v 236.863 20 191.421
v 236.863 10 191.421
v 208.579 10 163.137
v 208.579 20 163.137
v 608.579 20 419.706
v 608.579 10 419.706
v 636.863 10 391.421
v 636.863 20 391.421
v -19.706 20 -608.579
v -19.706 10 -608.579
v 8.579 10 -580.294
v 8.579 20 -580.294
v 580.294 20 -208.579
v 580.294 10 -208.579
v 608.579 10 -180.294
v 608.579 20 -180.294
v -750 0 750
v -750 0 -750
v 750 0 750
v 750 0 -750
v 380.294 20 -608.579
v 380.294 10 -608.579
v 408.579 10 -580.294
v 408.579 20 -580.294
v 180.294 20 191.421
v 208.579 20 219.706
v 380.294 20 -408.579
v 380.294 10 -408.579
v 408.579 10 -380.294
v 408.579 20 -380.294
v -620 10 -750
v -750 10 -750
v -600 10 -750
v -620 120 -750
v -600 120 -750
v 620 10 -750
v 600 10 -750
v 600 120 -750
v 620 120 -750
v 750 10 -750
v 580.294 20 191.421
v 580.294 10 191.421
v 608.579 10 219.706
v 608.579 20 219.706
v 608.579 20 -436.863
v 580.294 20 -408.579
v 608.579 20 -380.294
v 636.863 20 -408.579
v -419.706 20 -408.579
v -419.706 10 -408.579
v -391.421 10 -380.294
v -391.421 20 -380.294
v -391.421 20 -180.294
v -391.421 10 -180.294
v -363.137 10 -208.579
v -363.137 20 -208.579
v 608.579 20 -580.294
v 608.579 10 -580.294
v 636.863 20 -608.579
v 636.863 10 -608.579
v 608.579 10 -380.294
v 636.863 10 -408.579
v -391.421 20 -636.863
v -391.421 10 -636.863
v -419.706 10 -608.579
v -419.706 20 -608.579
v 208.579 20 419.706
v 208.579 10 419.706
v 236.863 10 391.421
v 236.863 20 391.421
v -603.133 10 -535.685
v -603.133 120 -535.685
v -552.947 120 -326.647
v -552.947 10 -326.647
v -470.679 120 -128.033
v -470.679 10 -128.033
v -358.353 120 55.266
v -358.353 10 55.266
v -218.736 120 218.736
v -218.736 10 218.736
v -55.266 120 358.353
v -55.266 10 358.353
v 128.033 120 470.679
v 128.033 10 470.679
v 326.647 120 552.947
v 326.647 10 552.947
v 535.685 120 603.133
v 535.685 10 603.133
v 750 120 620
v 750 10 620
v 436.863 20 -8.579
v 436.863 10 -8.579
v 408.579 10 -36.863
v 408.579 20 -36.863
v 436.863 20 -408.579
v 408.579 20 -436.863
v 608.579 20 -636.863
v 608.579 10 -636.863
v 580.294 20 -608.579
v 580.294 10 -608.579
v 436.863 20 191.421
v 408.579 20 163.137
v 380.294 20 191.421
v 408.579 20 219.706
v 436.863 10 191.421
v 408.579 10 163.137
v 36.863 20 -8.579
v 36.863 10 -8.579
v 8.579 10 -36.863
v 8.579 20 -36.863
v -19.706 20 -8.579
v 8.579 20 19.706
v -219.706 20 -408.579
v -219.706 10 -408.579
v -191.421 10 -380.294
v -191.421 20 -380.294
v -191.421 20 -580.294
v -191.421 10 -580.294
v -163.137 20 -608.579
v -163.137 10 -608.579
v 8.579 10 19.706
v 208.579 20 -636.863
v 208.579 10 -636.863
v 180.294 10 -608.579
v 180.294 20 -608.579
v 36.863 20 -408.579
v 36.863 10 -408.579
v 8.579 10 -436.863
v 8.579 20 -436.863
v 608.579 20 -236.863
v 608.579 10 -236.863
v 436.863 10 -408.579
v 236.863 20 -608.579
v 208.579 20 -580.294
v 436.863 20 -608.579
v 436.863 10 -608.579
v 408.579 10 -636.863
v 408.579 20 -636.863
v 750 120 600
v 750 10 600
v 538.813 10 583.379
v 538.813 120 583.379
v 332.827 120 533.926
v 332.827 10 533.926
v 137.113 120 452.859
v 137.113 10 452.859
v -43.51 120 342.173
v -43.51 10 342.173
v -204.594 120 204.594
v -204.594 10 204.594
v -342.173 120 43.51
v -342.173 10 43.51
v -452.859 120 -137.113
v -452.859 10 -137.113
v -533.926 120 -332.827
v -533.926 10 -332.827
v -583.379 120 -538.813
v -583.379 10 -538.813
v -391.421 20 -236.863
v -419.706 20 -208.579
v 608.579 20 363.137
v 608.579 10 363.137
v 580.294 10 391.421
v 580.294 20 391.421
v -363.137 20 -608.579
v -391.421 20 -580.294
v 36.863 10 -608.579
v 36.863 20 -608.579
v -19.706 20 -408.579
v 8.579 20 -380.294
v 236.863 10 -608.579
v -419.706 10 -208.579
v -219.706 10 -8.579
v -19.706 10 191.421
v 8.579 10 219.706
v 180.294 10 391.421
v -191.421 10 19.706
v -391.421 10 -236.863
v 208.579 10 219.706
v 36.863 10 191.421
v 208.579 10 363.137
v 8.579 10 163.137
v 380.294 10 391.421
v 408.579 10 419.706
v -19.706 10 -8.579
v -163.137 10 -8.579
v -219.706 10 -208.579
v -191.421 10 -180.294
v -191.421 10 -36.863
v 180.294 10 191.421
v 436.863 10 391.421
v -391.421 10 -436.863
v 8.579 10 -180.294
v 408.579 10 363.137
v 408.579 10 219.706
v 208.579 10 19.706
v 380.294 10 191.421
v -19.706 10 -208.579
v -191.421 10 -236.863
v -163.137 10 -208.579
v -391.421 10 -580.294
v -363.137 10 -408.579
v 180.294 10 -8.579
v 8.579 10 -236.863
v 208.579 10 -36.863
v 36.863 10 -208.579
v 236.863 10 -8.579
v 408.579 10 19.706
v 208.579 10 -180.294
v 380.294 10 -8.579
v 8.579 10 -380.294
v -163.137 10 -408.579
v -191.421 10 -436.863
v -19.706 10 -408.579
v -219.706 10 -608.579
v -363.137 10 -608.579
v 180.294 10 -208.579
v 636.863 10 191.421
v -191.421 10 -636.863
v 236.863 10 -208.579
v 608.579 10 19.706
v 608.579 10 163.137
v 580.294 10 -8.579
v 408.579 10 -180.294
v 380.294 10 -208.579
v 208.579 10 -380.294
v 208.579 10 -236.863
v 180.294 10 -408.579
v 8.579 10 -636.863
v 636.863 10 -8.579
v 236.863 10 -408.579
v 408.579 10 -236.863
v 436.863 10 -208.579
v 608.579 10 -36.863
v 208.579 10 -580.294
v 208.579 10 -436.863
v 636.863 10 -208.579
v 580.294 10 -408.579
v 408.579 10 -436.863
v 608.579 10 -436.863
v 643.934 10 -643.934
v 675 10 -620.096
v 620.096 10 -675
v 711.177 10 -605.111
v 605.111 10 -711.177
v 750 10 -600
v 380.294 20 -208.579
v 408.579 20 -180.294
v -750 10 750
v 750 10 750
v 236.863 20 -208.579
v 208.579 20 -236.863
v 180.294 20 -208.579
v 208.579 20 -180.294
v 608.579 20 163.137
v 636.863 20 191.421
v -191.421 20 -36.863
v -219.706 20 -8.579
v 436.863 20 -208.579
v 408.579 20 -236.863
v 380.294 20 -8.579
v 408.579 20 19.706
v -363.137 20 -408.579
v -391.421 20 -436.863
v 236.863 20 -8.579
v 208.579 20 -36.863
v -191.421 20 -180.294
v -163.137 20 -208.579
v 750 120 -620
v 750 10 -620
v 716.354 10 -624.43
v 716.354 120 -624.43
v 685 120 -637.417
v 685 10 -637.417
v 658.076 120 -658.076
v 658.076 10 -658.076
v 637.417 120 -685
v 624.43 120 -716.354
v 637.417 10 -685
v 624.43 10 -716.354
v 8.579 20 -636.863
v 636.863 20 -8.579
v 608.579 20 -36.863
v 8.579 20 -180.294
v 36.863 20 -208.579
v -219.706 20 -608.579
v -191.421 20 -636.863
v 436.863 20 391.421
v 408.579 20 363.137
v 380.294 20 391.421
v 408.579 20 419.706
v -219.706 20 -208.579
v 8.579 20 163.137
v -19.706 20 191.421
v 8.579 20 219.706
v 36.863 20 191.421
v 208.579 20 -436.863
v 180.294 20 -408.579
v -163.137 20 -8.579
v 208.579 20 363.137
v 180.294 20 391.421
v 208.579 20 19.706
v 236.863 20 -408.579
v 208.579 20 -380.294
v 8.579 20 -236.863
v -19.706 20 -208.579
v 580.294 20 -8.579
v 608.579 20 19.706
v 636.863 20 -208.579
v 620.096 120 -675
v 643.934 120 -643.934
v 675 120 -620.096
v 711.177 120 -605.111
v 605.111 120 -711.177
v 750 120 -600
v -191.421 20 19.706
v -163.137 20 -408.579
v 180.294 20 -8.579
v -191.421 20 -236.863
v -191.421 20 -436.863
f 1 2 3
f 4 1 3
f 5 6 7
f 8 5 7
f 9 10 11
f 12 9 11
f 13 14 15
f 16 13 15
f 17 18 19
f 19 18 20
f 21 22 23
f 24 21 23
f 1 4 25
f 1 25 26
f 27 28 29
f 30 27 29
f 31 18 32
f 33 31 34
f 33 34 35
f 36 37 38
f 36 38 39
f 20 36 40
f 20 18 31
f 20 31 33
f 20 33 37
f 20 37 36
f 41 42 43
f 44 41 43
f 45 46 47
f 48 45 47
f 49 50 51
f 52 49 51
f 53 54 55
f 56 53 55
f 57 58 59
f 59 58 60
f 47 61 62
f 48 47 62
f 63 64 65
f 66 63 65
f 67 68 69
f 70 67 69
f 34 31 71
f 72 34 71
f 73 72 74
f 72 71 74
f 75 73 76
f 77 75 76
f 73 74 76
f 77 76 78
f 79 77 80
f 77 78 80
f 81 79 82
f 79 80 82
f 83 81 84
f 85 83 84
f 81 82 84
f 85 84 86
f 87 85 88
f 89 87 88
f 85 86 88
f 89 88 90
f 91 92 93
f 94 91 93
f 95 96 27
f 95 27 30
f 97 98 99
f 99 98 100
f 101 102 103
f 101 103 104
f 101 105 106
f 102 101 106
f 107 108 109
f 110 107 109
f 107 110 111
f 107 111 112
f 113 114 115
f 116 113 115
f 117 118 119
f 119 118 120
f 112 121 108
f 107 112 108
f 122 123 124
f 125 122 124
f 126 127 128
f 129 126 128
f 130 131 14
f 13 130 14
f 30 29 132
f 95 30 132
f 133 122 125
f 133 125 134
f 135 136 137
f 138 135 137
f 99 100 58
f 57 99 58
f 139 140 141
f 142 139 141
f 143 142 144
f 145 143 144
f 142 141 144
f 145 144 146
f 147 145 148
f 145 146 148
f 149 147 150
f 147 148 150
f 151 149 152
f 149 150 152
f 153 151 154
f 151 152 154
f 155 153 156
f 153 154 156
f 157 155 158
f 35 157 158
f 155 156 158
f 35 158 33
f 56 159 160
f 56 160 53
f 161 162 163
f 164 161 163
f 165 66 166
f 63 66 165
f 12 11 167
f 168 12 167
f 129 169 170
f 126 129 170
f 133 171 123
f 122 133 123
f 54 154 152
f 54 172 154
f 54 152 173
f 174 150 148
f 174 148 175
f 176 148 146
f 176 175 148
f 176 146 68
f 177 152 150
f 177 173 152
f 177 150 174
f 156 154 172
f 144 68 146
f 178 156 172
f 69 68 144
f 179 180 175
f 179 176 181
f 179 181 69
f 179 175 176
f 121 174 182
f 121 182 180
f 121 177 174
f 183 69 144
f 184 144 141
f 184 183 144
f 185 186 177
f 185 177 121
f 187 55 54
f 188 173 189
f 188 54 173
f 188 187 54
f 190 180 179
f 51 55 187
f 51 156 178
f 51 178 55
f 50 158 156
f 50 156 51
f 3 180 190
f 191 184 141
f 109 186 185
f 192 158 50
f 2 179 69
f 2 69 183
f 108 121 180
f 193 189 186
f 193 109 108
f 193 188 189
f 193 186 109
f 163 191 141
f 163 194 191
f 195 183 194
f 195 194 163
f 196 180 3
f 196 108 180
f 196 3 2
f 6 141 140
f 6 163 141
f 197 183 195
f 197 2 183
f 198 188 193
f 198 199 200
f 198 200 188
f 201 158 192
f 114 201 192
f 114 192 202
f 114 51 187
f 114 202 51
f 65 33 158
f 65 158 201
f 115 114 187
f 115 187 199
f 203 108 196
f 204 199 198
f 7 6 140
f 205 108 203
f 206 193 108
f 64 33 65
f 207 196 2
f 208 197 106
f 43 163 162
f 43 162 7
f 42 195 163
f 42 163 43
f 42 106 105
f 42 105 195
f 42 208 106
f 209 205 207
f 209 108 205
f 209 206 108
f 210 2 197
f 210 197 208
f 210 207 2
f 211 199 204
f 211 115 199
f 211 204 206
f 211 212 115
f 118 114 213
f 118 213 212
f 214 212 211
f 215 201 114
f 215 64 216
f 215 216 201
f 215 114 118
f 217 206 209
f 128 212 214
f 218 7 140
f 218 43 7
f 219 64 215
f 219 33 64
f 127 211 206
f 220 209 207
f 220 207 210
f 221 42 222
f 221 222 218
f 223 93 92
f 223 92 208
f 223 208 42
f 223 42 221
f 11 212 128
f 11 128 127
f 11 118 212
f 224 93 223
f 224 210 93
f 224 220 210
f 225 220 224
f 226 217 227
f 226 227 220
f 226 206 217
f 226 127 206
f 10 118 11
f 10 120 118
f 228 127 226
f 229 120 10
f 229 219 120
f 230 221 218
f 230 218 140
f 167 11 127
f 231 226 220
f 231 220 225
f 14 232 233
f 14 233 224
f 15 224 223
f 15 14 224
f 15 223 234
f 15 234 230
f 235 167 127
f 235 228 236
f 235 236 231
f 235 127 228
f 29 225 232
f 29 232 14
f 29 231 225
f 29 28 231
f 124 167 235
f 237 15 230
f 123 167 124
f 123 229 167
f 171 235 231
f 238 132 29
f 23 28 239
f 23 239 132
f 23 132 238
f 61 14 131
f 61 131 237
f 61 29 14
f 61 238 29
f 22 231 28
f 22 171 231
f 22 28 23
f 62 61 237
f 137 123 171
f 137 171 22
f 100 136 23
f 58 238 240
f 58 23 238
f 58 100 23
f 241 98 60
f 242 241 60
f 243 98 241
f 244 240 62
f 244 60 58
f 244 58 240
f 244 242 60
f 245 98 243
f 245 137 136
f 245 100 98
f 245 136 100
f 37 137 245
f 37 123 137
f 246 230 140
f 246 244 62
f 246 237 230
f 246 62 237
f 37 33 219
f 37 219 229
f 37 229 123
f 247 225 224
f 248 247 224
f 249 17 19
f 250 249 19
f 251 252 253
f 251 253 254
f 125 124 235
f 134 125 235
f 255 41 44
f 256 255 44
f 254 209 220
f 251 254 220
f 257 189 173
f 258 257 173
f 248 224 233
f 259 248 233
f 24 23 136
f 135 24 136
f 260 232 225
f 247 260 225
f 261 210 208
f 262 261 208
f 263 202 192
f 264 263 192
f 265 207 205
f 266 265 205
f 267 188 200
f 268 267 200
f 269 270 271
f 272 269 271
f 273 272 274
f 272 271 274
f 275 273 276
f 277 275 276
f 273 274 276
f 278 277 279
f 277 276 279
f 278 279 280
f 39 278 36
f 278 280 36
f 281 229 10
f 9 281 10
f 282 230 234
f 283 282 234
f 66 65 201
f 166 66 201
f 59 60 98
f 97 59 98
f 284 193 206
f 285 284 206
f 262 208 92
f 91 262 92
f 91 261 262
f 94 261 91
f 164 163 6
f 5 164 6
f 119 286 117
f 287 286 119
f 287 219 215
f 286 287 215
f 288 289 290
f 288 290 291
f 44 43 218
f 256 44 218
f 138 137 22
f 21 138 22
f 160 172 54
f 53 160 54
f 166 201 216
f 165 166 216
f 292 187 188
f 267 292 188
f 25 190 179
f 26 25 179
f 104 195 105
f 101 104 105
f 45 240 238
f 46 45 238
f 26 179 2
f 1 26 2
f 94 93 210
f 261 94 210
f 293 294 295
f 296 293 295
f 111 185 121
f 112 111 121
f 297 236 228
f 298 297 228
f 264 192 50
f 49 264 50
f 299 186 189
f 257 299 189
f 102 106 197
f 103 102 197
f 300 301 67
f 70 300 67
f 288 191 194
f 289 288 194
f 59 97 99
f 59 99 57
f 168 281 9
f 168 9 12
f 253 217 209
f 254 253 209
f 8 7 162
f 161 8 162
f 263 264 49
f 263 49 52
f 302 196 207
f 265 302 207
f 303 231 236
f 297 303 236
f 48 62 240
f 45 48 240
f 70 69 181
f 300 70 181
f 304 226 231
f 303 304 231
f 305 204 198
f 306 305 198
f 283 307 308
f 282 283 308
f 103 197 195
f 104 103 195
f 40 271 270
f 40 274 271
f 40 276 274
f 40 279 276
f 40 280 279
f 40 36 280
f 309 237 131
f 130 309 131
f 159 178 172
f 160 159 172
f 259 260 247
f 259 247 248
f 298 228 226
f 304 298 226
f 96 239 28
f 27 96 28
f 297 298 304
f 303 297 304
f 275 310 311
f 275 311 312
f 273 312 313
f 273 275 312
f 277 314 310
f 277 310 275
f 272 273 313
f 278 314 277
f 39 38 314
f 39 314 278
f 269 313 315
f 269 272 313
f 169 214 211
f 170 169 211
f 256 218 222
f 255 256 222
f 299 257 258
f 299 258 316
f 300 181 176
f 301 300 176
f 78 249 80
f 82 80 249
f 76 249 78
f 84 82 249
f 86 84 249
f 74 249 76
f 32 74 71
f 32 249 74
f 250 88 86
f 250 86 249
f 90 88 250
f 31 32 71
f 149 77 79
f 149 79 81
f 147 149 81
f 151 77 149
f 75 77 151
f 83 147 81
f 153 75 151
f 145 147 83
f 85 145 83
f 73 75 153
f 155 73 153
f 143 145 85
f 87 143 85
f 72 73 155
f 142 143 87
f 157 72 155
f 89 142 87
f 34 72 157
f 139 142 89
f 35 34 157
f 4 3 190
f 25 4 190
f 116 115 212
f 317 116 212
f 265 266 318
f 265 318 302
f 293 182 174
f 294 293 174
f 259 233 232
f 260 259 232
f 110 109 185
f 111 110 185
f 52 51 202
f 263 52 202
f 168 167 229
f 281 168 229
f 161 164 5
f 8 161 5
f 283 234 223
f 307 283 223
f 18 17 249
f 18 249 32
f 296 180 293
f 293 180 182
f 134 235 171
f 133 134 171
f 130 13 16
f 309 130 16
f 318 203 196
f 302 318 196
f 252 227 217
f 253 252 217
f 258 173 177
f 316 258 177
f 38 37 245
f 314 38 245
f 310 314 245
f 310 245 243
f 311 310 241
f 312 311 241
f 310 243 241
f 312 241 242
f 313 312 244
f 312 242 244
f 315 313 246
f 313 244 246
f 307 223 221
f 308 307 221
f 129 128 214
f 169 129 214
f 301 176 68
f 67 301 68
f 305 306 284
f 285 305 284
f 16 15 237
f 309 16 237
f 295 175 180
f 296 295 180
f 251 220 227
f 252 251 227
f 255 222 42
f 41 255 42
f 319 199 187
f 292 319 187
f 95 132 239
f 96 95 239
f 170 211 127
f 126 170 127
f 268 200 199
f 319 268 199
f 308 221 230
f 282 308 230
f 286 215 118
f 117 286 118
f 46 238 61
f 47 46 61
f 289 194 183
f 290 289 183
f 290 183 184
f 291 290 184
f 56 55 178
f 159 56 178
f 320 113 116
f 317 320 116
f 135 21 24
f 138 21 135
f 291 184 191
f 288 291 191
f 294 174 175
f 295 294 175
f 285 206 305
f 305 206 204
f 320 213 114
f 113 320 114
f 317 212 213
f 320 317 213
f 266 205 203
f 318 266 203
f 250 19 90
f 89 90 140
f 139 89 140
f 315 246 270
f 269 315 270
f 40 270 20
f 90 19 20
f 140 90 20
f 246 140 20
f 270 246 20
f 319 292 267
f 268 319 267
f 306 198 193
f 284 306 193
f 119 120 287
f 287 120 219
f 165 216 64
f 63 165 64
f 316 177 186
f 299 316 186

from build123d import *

# Parameters (mm, degrees)
SKETCH2_W           = 1500
SKETCH2_H           = 1500
BOSS_EXTRUDE1_DEPTH = 10
BOSS_EXTRUDE2_DEPTH = 110
BOSS_EXTRUDE3_DEPTH = 10


with BuildPart() as part:
    # Sketch2 → Boss-Extrude1 (new body)
    with BuildSketch(Plane(origin=(0, 0, 0), x_dir=(1, 0, 0), z_dir=(0, 1, 0))):
        Rectangle(SKETCH2_W, SKETCH2_H)
    extrude(amount=BOSS_EXTRUDE1_DEPTH)

    # Sketch3 → Boss-Extrude2 (add)
    with BuildSketch(Plane(origin=(0, 10, 0), x_dir=(1, 0, 0), z_dir=(0, 1, 0))):
        with BuildLine():
            ThreePointArc((750, -600), (-204.594154602, -204.594154602), (-600, 750))
            Line((-600, 750), (-620, 750))
            ThreePointArc((-620, 750), (-218.736290226, -218.736290226), (750, -620))
            Line((750, -620), (750, -600))
        make_face()
        with BuildLine():
            Line((620, 750), (600, 750))
            ThreePointArc((600, 750), (643.933982822, 643.933982822), (750, 600))
            Line((750, 600), (750, 620))
            ThreePointArc((750, 620), (658.076118446, 658.076118446), (620, 750))
        make_face()
    extrude(amount=BOSS_EXTRUDE2_DEPTH)

    # Sketch4 → Boss-Extrude3 (add)
    with BuildSketch(Plane(origin=(0, 10, 0), x_dir=(1, 0, 0), z_dir=(0, 1, 0))):
        Polygon((-391.421356236, 636.86291501), (-419.705627484, 608.578643763), (-391.421356236, 580.294372515), (-363.137084989, 608.578643763), align=None)
        Polygon((-191.421356236, 636.86291501), (-219.705627484, 608.578643763), (-191.421356236, 580.294372515), (-163.137084989, 608.578643763), align=None)
        Polygon((8.578643763, 636.86291501), (-19.705627484, 608.578643763), (8.578643763, 580.294372515), (36.862915011, 608.578643763), align=None)
        Polygon((208.578643763, 636.86291501), (180.294372516, 608.578643763), (208.578643763, 580.294372515), (236.862915011, 608.578643763), align=None)
        Polygon((408.578643763, 636.86291501), (380.294372515, 608.578643763), (408.578643763, 580.294372515), (436.86291501, 608.578643763), align=None)
        Polygon((-191.421356236, 436.86291501), (-219.705627484, 408.578643763), (-191.421356236, 380.294372515), (-163.137084989, 408.578643763), align=None)
        Polygon((8.578643763, 436.86291501), (-19.705627484, 408.578643763), (8.578643763, 380.294372515), (36.862915011, 408.578643763), align=None)
        Polygon((208.578643763, 436.86291501), (180.294372516, 408.578643763), (208.578643763, 380.294372515), (236.862915011, 408.578643763), align=None)
        Polygon((408.578643763, 436.86291501), (380.294372515, 408.578643763), (408.578643763, 380.294372515), (436.86291501, 408.578643763), align=None)
        Polygon((-191.421356236, 236.86291501), (-219.705627484, 208.578643763), (-191.421356236, 180.294372515), (-163.137084989, 208.578643763), align=None)
        Polygon((8.578643763, 236.86291501), (-19.705627484, 208.578643763), (8.578643763, 180.294372515), (36.862915011, 208.578643763), align=None)
        Polygon((208.578643763, 236.86291501), (180.294372516, 208.578643763), (208.578643763, 180.294372515), (236.862915011, 208.578643763), align=None)
        Polygon((408.578643763, 236.86291501), (380.294372515, 208.578643763), (408.578643763, 180.294372515), (436.86291501, 208.578643763), align=None)
        Polygon((-191.421356236, 36.86291501), (-219.705627484, 8.578643763), (-191.421356236, -19.705627485), (-163.137084989, 8.578643763), align=None)
        Polygon((8.578643763, 36.86291501), (-19.705627484, 8.578643763), (8.578643763, -19.705627485), (36.862915011, 8.578643763), align=None)
        Polygon((208.578643763, 36.86291501), (180.294372516, 8.578643763), (208.578643763, -19.705627485), (236.862915011, 8.578643763), align=None)
        Polygon((408.578643763, 36.86291501), (380.294372515, 8.578643763), (408.578643763, -19.705627485), (436.86291501, 8.578643763), align=None)
        Polygon((8.578643763, -163.13708499), (-19.705627484, -191.421356237), (8.578643763, -219.705627485), (36.862915011, -191.421356237), align=None)
        Polygon((208.578643763, -163.13708499), (180.294372516, -191.421356237), (208.578643763, -219.705627485), (236.862915011, -191.421356237), align=None)
        Polygon((408.578643763, -163.13708499), (380.294372515, -191.421356237), (408.578643763, -219.705627485), (436.86291501, -191.421356237), align=None)
        Polygon((-391.421356236, 436.86291501), (-419.705627484, 408.578643763), (-391.421356236, 380.294372515), (-363.137084989, 408.578643763), align=None)
        Polygon((-391.421356236, 236.86291501), (-419.705627484, 208.578643763), (-391.421356236, 180.294372515), (-363.137084989, 208.578643763), align=None)
        Polygon((208.578643763, -363.13708499), (180.294372516, -391.421356237), (208.578643763, -419.705627485), (236.862915011, -391.421356237), align=None)
        Polygon((408.578643763, -363.13708499), (380.294372515, -391.421356237), (408.578643763, -419.705627485), (436.86291501, -391.421356237), align=None)
        Polygon((608.578643763, 636.86291501), (580.294372515, 608.578643763), (608.578643763, 580.294372515), (636.86291501, 608.578643763), align=None)
        Polygon((608.578643763, 436.86291501), (580.294372515, 408.578643763), (608.578643763, 380.294372515), (636.86291501, 408.578643763), align=None)
        Polygon((608.578643763, 236.86291501), (580.294372515, 208.578643763), (608.578643763, 180.294372515), (636.86291501, 208.578643763), align=None)
        Polygon((608.578643763, 36.86291501), (580.294372515, 8.578643763), (608.578643763, -19.705627485), (636.86291501, 8.578643763), align=None)
        Polygon((608.578643763, -163.13708499), (580.294372515, -191.421356237), (608.578643763, -219.705627485), (636.86291501, -191.421356237), align=None)
        Polygon((608.578643763, -363.13708499), (580.294372515, -391.421356237), (608.578643763, -419.705627485), (636.86291501, -391.421356237), align=None)
    extrude(amount=BOSS_EXTRUDE3_DEPTH)


solid = part.part
